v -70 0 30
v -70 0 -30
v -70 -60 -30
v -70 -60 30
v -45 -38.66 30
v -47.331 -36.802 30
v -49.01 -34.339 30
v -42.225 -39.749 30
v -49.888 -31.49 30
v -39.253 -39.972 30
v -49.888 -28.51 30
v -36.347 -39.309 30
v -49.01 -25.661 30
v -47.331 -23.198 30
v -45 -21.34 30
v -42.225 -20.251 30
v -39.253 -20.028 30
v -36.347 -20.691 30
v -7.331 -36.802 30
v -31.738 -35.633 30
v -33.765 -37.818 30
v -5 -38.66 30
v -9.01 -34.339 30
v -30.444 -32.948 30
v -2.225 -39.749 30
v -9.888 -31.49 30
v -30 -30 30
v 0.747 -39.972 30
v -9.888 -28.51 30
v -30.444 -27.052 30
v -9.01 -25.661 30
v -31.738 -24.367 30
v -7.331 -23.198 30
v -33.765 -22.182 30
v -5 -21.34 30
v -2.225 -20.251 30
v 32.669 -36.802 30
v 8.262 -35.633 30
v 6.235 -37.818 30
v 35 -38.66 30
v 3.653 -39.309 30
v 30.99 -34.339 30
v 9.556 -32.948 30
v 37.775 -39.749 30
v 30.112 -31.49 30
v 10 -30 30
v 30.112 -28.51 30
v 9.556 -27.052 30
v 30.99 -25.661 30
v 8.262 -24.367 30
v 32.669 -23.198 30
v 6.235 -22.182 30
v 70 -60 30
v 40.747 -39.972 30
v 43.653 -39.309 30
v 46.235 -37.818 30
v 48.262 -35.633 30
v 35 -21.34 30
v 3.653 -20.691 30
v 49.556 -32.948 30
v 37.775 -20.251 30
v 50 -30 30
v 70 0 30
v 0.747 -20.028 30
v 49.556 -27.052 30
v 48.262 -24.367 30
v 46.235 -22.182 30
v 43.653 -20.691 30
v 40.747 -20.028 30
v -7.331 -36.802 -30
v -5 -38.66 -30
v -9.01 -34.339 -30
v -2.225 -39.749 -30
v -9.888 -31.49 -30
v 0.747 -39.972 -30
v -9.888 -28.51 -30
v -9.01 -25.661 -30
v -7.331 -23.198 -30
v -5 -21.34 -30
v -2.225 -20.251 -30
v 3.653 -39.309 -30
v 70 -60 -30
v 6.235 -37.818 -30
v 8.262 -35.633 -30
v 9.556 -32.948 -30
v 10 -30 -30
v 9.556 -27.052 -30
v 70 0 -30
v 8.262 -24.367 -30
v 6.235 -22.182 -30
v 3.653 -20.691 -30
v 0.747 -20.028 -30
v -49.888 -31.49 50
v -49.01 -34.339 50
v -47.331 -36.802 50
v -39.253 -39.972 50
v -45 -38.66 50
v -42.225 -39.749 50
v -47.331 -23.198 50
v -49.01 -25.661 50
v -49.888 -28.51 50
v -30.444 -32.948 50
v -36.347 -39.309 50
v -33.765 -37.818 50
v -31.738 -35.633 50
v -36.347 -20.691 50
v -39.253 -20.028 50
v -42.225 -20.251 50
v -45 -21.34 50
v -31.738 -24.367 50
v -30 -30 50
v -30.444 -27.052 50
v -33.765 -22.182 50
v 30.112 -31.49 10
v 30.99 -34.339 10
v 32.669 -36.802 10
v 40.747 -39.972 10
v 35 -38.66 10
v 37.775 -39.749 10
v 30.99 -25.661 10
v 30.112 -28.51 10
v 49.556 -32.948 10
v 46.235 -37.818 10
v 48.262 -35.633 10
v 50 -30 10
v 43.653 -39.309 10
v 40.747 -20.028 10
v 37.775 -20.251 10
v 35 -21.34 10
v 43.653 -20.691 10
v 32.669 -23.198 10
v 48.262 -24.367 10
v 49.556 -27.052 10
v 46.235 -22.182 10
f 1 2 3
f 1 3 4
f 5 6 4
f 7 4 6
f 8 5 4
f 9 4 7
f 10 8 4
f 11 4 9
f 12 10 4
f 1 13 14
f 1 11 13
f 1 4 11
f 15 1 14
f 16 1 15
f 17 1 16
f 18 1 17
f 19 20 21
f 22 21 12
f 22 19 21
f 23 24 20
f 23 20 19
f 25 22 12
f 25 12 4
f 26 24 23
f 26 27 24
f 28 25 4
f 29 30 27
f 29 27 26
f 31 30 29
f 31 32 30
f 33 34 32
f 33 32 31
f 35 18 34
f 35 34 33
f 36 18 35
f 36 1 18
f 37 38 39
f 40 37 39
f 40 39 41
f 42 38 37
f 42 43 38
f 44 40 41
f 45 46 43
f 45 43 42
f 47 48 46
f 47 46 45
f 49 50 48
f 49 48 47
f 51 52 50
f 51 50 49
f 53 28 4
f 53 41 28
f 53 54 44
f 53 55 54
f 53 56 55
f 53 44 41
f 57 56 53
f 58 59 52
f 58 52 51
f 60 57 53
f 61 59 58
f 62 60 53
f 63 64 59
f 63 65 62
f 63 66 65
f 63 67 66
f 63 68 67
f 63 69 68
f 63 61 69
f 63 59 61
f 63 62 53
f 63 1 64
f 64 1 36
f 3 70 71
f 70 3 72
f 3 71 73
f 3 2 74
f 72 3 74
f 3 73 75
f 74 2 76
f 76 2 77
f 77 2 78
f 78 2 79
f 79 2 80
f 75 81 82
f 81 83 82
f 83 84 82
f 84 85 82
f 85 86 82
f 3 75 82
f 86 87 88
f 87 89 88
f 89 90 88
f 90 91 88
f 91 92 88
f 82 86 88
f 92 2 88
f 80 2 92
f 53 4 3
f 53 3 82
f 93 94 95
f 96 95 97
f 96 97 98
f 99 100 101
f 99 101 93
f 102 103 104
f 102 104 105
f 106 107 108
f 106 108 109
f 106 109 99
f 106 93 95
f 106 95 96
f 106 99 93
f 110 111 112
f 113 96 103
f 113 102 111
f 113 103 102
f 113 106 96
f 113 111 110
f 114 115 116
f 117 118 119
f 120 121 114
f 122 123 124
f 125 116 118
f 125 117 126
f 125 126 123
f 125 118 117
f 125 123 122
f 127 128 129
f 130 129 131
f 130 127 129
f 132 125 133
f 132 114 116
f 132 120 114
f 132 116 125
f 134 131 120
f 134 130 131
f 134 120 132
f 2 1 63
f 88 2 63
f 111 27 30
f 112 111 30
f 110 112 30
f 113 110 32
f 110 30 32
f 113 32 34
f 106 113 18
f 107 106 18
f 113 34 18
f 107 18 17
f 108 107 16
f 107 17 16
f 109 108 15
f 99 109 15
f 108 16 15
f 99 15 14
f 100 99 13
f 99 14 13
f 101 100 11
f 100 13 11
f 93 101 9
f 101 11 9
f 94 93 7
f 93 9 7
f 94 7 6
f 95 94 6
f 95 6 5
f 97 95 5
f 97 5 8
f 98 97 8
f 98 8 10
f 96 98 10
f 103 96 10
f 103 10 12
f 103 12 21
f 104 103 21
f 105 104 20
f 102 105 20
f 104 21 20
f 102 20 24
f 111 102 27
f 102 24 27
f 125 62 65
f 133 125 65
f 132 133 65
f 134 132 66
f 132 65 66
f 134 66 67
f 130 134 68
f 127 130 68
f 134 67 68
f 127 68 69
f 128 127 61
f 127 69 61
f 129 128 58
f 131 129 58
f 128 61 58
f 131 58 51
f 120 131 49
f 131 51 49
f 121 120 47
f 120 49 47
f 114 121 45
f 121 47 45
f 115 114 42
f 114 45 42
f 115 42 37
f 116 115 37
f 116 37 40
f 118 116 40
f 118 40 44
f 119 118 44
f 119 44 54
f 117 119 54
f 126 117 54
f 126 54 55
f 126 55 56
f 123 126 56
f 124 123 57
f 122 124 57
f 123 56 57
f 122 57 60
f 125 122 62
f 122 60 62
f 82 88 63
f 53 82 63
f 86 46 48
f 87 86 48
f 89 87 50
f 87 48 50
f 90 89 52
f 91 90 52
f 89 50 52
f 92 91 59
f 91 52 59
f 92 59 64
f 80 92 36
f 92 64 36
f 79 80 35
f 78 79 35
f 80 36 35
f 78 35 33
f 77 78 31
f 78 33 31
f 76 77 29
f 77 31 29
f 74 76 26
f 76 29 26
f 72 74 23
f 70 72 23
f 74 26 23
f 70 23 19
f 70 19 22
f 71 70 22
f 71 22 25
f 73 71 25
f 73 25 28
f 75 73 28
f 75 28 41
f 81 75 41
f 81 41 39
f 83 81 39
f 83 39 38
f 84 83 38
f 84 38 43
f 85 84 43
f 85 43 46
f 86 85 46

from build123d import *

# Parameters (mm, degrees)
F0_W     = 140
F0_H     = 60
F1_DEPTH = 60
F2_R     = 10
F3_DEPTH = 20
F4_R     = 10
F5_DEPTH = 65
F6_R     = 10
F7_DEPTH = 20


with BuildPart() as f1:
    # F0 (on Front) → F1 (new body)
    with BuildSketch(Plane.XZ):
        Rectangle(F0_W, F0_H)
    extrude(amount=F1_DEPTH)

    # F2 (on face) → F3 (join)
    with BuildSketch(Plane.XY.offset(30)):
        with Locations((-40, -30)):
            Circle(F2_R)
    extrude(amount=F3_DEPTH)

    # F4 (on face) → F5 (cut)
    with BuildSketch(Plane.XY.offset(30)):
        with Locations((0, -30)):
            Circle(F4_R)
    extrude(amount=-F5_DEPTH, mode=Mode.SUBTRACT)

    # F6 (on face) → F7 (cut)
    with BuildSketch(Plane.XY.offset(30)):
        with Locations((40, -30)):
            Circle(F6_R)
    extrude(amount=-F7_DEPTH, mode=Mode.SUBTRACT)


solid = f1.part
